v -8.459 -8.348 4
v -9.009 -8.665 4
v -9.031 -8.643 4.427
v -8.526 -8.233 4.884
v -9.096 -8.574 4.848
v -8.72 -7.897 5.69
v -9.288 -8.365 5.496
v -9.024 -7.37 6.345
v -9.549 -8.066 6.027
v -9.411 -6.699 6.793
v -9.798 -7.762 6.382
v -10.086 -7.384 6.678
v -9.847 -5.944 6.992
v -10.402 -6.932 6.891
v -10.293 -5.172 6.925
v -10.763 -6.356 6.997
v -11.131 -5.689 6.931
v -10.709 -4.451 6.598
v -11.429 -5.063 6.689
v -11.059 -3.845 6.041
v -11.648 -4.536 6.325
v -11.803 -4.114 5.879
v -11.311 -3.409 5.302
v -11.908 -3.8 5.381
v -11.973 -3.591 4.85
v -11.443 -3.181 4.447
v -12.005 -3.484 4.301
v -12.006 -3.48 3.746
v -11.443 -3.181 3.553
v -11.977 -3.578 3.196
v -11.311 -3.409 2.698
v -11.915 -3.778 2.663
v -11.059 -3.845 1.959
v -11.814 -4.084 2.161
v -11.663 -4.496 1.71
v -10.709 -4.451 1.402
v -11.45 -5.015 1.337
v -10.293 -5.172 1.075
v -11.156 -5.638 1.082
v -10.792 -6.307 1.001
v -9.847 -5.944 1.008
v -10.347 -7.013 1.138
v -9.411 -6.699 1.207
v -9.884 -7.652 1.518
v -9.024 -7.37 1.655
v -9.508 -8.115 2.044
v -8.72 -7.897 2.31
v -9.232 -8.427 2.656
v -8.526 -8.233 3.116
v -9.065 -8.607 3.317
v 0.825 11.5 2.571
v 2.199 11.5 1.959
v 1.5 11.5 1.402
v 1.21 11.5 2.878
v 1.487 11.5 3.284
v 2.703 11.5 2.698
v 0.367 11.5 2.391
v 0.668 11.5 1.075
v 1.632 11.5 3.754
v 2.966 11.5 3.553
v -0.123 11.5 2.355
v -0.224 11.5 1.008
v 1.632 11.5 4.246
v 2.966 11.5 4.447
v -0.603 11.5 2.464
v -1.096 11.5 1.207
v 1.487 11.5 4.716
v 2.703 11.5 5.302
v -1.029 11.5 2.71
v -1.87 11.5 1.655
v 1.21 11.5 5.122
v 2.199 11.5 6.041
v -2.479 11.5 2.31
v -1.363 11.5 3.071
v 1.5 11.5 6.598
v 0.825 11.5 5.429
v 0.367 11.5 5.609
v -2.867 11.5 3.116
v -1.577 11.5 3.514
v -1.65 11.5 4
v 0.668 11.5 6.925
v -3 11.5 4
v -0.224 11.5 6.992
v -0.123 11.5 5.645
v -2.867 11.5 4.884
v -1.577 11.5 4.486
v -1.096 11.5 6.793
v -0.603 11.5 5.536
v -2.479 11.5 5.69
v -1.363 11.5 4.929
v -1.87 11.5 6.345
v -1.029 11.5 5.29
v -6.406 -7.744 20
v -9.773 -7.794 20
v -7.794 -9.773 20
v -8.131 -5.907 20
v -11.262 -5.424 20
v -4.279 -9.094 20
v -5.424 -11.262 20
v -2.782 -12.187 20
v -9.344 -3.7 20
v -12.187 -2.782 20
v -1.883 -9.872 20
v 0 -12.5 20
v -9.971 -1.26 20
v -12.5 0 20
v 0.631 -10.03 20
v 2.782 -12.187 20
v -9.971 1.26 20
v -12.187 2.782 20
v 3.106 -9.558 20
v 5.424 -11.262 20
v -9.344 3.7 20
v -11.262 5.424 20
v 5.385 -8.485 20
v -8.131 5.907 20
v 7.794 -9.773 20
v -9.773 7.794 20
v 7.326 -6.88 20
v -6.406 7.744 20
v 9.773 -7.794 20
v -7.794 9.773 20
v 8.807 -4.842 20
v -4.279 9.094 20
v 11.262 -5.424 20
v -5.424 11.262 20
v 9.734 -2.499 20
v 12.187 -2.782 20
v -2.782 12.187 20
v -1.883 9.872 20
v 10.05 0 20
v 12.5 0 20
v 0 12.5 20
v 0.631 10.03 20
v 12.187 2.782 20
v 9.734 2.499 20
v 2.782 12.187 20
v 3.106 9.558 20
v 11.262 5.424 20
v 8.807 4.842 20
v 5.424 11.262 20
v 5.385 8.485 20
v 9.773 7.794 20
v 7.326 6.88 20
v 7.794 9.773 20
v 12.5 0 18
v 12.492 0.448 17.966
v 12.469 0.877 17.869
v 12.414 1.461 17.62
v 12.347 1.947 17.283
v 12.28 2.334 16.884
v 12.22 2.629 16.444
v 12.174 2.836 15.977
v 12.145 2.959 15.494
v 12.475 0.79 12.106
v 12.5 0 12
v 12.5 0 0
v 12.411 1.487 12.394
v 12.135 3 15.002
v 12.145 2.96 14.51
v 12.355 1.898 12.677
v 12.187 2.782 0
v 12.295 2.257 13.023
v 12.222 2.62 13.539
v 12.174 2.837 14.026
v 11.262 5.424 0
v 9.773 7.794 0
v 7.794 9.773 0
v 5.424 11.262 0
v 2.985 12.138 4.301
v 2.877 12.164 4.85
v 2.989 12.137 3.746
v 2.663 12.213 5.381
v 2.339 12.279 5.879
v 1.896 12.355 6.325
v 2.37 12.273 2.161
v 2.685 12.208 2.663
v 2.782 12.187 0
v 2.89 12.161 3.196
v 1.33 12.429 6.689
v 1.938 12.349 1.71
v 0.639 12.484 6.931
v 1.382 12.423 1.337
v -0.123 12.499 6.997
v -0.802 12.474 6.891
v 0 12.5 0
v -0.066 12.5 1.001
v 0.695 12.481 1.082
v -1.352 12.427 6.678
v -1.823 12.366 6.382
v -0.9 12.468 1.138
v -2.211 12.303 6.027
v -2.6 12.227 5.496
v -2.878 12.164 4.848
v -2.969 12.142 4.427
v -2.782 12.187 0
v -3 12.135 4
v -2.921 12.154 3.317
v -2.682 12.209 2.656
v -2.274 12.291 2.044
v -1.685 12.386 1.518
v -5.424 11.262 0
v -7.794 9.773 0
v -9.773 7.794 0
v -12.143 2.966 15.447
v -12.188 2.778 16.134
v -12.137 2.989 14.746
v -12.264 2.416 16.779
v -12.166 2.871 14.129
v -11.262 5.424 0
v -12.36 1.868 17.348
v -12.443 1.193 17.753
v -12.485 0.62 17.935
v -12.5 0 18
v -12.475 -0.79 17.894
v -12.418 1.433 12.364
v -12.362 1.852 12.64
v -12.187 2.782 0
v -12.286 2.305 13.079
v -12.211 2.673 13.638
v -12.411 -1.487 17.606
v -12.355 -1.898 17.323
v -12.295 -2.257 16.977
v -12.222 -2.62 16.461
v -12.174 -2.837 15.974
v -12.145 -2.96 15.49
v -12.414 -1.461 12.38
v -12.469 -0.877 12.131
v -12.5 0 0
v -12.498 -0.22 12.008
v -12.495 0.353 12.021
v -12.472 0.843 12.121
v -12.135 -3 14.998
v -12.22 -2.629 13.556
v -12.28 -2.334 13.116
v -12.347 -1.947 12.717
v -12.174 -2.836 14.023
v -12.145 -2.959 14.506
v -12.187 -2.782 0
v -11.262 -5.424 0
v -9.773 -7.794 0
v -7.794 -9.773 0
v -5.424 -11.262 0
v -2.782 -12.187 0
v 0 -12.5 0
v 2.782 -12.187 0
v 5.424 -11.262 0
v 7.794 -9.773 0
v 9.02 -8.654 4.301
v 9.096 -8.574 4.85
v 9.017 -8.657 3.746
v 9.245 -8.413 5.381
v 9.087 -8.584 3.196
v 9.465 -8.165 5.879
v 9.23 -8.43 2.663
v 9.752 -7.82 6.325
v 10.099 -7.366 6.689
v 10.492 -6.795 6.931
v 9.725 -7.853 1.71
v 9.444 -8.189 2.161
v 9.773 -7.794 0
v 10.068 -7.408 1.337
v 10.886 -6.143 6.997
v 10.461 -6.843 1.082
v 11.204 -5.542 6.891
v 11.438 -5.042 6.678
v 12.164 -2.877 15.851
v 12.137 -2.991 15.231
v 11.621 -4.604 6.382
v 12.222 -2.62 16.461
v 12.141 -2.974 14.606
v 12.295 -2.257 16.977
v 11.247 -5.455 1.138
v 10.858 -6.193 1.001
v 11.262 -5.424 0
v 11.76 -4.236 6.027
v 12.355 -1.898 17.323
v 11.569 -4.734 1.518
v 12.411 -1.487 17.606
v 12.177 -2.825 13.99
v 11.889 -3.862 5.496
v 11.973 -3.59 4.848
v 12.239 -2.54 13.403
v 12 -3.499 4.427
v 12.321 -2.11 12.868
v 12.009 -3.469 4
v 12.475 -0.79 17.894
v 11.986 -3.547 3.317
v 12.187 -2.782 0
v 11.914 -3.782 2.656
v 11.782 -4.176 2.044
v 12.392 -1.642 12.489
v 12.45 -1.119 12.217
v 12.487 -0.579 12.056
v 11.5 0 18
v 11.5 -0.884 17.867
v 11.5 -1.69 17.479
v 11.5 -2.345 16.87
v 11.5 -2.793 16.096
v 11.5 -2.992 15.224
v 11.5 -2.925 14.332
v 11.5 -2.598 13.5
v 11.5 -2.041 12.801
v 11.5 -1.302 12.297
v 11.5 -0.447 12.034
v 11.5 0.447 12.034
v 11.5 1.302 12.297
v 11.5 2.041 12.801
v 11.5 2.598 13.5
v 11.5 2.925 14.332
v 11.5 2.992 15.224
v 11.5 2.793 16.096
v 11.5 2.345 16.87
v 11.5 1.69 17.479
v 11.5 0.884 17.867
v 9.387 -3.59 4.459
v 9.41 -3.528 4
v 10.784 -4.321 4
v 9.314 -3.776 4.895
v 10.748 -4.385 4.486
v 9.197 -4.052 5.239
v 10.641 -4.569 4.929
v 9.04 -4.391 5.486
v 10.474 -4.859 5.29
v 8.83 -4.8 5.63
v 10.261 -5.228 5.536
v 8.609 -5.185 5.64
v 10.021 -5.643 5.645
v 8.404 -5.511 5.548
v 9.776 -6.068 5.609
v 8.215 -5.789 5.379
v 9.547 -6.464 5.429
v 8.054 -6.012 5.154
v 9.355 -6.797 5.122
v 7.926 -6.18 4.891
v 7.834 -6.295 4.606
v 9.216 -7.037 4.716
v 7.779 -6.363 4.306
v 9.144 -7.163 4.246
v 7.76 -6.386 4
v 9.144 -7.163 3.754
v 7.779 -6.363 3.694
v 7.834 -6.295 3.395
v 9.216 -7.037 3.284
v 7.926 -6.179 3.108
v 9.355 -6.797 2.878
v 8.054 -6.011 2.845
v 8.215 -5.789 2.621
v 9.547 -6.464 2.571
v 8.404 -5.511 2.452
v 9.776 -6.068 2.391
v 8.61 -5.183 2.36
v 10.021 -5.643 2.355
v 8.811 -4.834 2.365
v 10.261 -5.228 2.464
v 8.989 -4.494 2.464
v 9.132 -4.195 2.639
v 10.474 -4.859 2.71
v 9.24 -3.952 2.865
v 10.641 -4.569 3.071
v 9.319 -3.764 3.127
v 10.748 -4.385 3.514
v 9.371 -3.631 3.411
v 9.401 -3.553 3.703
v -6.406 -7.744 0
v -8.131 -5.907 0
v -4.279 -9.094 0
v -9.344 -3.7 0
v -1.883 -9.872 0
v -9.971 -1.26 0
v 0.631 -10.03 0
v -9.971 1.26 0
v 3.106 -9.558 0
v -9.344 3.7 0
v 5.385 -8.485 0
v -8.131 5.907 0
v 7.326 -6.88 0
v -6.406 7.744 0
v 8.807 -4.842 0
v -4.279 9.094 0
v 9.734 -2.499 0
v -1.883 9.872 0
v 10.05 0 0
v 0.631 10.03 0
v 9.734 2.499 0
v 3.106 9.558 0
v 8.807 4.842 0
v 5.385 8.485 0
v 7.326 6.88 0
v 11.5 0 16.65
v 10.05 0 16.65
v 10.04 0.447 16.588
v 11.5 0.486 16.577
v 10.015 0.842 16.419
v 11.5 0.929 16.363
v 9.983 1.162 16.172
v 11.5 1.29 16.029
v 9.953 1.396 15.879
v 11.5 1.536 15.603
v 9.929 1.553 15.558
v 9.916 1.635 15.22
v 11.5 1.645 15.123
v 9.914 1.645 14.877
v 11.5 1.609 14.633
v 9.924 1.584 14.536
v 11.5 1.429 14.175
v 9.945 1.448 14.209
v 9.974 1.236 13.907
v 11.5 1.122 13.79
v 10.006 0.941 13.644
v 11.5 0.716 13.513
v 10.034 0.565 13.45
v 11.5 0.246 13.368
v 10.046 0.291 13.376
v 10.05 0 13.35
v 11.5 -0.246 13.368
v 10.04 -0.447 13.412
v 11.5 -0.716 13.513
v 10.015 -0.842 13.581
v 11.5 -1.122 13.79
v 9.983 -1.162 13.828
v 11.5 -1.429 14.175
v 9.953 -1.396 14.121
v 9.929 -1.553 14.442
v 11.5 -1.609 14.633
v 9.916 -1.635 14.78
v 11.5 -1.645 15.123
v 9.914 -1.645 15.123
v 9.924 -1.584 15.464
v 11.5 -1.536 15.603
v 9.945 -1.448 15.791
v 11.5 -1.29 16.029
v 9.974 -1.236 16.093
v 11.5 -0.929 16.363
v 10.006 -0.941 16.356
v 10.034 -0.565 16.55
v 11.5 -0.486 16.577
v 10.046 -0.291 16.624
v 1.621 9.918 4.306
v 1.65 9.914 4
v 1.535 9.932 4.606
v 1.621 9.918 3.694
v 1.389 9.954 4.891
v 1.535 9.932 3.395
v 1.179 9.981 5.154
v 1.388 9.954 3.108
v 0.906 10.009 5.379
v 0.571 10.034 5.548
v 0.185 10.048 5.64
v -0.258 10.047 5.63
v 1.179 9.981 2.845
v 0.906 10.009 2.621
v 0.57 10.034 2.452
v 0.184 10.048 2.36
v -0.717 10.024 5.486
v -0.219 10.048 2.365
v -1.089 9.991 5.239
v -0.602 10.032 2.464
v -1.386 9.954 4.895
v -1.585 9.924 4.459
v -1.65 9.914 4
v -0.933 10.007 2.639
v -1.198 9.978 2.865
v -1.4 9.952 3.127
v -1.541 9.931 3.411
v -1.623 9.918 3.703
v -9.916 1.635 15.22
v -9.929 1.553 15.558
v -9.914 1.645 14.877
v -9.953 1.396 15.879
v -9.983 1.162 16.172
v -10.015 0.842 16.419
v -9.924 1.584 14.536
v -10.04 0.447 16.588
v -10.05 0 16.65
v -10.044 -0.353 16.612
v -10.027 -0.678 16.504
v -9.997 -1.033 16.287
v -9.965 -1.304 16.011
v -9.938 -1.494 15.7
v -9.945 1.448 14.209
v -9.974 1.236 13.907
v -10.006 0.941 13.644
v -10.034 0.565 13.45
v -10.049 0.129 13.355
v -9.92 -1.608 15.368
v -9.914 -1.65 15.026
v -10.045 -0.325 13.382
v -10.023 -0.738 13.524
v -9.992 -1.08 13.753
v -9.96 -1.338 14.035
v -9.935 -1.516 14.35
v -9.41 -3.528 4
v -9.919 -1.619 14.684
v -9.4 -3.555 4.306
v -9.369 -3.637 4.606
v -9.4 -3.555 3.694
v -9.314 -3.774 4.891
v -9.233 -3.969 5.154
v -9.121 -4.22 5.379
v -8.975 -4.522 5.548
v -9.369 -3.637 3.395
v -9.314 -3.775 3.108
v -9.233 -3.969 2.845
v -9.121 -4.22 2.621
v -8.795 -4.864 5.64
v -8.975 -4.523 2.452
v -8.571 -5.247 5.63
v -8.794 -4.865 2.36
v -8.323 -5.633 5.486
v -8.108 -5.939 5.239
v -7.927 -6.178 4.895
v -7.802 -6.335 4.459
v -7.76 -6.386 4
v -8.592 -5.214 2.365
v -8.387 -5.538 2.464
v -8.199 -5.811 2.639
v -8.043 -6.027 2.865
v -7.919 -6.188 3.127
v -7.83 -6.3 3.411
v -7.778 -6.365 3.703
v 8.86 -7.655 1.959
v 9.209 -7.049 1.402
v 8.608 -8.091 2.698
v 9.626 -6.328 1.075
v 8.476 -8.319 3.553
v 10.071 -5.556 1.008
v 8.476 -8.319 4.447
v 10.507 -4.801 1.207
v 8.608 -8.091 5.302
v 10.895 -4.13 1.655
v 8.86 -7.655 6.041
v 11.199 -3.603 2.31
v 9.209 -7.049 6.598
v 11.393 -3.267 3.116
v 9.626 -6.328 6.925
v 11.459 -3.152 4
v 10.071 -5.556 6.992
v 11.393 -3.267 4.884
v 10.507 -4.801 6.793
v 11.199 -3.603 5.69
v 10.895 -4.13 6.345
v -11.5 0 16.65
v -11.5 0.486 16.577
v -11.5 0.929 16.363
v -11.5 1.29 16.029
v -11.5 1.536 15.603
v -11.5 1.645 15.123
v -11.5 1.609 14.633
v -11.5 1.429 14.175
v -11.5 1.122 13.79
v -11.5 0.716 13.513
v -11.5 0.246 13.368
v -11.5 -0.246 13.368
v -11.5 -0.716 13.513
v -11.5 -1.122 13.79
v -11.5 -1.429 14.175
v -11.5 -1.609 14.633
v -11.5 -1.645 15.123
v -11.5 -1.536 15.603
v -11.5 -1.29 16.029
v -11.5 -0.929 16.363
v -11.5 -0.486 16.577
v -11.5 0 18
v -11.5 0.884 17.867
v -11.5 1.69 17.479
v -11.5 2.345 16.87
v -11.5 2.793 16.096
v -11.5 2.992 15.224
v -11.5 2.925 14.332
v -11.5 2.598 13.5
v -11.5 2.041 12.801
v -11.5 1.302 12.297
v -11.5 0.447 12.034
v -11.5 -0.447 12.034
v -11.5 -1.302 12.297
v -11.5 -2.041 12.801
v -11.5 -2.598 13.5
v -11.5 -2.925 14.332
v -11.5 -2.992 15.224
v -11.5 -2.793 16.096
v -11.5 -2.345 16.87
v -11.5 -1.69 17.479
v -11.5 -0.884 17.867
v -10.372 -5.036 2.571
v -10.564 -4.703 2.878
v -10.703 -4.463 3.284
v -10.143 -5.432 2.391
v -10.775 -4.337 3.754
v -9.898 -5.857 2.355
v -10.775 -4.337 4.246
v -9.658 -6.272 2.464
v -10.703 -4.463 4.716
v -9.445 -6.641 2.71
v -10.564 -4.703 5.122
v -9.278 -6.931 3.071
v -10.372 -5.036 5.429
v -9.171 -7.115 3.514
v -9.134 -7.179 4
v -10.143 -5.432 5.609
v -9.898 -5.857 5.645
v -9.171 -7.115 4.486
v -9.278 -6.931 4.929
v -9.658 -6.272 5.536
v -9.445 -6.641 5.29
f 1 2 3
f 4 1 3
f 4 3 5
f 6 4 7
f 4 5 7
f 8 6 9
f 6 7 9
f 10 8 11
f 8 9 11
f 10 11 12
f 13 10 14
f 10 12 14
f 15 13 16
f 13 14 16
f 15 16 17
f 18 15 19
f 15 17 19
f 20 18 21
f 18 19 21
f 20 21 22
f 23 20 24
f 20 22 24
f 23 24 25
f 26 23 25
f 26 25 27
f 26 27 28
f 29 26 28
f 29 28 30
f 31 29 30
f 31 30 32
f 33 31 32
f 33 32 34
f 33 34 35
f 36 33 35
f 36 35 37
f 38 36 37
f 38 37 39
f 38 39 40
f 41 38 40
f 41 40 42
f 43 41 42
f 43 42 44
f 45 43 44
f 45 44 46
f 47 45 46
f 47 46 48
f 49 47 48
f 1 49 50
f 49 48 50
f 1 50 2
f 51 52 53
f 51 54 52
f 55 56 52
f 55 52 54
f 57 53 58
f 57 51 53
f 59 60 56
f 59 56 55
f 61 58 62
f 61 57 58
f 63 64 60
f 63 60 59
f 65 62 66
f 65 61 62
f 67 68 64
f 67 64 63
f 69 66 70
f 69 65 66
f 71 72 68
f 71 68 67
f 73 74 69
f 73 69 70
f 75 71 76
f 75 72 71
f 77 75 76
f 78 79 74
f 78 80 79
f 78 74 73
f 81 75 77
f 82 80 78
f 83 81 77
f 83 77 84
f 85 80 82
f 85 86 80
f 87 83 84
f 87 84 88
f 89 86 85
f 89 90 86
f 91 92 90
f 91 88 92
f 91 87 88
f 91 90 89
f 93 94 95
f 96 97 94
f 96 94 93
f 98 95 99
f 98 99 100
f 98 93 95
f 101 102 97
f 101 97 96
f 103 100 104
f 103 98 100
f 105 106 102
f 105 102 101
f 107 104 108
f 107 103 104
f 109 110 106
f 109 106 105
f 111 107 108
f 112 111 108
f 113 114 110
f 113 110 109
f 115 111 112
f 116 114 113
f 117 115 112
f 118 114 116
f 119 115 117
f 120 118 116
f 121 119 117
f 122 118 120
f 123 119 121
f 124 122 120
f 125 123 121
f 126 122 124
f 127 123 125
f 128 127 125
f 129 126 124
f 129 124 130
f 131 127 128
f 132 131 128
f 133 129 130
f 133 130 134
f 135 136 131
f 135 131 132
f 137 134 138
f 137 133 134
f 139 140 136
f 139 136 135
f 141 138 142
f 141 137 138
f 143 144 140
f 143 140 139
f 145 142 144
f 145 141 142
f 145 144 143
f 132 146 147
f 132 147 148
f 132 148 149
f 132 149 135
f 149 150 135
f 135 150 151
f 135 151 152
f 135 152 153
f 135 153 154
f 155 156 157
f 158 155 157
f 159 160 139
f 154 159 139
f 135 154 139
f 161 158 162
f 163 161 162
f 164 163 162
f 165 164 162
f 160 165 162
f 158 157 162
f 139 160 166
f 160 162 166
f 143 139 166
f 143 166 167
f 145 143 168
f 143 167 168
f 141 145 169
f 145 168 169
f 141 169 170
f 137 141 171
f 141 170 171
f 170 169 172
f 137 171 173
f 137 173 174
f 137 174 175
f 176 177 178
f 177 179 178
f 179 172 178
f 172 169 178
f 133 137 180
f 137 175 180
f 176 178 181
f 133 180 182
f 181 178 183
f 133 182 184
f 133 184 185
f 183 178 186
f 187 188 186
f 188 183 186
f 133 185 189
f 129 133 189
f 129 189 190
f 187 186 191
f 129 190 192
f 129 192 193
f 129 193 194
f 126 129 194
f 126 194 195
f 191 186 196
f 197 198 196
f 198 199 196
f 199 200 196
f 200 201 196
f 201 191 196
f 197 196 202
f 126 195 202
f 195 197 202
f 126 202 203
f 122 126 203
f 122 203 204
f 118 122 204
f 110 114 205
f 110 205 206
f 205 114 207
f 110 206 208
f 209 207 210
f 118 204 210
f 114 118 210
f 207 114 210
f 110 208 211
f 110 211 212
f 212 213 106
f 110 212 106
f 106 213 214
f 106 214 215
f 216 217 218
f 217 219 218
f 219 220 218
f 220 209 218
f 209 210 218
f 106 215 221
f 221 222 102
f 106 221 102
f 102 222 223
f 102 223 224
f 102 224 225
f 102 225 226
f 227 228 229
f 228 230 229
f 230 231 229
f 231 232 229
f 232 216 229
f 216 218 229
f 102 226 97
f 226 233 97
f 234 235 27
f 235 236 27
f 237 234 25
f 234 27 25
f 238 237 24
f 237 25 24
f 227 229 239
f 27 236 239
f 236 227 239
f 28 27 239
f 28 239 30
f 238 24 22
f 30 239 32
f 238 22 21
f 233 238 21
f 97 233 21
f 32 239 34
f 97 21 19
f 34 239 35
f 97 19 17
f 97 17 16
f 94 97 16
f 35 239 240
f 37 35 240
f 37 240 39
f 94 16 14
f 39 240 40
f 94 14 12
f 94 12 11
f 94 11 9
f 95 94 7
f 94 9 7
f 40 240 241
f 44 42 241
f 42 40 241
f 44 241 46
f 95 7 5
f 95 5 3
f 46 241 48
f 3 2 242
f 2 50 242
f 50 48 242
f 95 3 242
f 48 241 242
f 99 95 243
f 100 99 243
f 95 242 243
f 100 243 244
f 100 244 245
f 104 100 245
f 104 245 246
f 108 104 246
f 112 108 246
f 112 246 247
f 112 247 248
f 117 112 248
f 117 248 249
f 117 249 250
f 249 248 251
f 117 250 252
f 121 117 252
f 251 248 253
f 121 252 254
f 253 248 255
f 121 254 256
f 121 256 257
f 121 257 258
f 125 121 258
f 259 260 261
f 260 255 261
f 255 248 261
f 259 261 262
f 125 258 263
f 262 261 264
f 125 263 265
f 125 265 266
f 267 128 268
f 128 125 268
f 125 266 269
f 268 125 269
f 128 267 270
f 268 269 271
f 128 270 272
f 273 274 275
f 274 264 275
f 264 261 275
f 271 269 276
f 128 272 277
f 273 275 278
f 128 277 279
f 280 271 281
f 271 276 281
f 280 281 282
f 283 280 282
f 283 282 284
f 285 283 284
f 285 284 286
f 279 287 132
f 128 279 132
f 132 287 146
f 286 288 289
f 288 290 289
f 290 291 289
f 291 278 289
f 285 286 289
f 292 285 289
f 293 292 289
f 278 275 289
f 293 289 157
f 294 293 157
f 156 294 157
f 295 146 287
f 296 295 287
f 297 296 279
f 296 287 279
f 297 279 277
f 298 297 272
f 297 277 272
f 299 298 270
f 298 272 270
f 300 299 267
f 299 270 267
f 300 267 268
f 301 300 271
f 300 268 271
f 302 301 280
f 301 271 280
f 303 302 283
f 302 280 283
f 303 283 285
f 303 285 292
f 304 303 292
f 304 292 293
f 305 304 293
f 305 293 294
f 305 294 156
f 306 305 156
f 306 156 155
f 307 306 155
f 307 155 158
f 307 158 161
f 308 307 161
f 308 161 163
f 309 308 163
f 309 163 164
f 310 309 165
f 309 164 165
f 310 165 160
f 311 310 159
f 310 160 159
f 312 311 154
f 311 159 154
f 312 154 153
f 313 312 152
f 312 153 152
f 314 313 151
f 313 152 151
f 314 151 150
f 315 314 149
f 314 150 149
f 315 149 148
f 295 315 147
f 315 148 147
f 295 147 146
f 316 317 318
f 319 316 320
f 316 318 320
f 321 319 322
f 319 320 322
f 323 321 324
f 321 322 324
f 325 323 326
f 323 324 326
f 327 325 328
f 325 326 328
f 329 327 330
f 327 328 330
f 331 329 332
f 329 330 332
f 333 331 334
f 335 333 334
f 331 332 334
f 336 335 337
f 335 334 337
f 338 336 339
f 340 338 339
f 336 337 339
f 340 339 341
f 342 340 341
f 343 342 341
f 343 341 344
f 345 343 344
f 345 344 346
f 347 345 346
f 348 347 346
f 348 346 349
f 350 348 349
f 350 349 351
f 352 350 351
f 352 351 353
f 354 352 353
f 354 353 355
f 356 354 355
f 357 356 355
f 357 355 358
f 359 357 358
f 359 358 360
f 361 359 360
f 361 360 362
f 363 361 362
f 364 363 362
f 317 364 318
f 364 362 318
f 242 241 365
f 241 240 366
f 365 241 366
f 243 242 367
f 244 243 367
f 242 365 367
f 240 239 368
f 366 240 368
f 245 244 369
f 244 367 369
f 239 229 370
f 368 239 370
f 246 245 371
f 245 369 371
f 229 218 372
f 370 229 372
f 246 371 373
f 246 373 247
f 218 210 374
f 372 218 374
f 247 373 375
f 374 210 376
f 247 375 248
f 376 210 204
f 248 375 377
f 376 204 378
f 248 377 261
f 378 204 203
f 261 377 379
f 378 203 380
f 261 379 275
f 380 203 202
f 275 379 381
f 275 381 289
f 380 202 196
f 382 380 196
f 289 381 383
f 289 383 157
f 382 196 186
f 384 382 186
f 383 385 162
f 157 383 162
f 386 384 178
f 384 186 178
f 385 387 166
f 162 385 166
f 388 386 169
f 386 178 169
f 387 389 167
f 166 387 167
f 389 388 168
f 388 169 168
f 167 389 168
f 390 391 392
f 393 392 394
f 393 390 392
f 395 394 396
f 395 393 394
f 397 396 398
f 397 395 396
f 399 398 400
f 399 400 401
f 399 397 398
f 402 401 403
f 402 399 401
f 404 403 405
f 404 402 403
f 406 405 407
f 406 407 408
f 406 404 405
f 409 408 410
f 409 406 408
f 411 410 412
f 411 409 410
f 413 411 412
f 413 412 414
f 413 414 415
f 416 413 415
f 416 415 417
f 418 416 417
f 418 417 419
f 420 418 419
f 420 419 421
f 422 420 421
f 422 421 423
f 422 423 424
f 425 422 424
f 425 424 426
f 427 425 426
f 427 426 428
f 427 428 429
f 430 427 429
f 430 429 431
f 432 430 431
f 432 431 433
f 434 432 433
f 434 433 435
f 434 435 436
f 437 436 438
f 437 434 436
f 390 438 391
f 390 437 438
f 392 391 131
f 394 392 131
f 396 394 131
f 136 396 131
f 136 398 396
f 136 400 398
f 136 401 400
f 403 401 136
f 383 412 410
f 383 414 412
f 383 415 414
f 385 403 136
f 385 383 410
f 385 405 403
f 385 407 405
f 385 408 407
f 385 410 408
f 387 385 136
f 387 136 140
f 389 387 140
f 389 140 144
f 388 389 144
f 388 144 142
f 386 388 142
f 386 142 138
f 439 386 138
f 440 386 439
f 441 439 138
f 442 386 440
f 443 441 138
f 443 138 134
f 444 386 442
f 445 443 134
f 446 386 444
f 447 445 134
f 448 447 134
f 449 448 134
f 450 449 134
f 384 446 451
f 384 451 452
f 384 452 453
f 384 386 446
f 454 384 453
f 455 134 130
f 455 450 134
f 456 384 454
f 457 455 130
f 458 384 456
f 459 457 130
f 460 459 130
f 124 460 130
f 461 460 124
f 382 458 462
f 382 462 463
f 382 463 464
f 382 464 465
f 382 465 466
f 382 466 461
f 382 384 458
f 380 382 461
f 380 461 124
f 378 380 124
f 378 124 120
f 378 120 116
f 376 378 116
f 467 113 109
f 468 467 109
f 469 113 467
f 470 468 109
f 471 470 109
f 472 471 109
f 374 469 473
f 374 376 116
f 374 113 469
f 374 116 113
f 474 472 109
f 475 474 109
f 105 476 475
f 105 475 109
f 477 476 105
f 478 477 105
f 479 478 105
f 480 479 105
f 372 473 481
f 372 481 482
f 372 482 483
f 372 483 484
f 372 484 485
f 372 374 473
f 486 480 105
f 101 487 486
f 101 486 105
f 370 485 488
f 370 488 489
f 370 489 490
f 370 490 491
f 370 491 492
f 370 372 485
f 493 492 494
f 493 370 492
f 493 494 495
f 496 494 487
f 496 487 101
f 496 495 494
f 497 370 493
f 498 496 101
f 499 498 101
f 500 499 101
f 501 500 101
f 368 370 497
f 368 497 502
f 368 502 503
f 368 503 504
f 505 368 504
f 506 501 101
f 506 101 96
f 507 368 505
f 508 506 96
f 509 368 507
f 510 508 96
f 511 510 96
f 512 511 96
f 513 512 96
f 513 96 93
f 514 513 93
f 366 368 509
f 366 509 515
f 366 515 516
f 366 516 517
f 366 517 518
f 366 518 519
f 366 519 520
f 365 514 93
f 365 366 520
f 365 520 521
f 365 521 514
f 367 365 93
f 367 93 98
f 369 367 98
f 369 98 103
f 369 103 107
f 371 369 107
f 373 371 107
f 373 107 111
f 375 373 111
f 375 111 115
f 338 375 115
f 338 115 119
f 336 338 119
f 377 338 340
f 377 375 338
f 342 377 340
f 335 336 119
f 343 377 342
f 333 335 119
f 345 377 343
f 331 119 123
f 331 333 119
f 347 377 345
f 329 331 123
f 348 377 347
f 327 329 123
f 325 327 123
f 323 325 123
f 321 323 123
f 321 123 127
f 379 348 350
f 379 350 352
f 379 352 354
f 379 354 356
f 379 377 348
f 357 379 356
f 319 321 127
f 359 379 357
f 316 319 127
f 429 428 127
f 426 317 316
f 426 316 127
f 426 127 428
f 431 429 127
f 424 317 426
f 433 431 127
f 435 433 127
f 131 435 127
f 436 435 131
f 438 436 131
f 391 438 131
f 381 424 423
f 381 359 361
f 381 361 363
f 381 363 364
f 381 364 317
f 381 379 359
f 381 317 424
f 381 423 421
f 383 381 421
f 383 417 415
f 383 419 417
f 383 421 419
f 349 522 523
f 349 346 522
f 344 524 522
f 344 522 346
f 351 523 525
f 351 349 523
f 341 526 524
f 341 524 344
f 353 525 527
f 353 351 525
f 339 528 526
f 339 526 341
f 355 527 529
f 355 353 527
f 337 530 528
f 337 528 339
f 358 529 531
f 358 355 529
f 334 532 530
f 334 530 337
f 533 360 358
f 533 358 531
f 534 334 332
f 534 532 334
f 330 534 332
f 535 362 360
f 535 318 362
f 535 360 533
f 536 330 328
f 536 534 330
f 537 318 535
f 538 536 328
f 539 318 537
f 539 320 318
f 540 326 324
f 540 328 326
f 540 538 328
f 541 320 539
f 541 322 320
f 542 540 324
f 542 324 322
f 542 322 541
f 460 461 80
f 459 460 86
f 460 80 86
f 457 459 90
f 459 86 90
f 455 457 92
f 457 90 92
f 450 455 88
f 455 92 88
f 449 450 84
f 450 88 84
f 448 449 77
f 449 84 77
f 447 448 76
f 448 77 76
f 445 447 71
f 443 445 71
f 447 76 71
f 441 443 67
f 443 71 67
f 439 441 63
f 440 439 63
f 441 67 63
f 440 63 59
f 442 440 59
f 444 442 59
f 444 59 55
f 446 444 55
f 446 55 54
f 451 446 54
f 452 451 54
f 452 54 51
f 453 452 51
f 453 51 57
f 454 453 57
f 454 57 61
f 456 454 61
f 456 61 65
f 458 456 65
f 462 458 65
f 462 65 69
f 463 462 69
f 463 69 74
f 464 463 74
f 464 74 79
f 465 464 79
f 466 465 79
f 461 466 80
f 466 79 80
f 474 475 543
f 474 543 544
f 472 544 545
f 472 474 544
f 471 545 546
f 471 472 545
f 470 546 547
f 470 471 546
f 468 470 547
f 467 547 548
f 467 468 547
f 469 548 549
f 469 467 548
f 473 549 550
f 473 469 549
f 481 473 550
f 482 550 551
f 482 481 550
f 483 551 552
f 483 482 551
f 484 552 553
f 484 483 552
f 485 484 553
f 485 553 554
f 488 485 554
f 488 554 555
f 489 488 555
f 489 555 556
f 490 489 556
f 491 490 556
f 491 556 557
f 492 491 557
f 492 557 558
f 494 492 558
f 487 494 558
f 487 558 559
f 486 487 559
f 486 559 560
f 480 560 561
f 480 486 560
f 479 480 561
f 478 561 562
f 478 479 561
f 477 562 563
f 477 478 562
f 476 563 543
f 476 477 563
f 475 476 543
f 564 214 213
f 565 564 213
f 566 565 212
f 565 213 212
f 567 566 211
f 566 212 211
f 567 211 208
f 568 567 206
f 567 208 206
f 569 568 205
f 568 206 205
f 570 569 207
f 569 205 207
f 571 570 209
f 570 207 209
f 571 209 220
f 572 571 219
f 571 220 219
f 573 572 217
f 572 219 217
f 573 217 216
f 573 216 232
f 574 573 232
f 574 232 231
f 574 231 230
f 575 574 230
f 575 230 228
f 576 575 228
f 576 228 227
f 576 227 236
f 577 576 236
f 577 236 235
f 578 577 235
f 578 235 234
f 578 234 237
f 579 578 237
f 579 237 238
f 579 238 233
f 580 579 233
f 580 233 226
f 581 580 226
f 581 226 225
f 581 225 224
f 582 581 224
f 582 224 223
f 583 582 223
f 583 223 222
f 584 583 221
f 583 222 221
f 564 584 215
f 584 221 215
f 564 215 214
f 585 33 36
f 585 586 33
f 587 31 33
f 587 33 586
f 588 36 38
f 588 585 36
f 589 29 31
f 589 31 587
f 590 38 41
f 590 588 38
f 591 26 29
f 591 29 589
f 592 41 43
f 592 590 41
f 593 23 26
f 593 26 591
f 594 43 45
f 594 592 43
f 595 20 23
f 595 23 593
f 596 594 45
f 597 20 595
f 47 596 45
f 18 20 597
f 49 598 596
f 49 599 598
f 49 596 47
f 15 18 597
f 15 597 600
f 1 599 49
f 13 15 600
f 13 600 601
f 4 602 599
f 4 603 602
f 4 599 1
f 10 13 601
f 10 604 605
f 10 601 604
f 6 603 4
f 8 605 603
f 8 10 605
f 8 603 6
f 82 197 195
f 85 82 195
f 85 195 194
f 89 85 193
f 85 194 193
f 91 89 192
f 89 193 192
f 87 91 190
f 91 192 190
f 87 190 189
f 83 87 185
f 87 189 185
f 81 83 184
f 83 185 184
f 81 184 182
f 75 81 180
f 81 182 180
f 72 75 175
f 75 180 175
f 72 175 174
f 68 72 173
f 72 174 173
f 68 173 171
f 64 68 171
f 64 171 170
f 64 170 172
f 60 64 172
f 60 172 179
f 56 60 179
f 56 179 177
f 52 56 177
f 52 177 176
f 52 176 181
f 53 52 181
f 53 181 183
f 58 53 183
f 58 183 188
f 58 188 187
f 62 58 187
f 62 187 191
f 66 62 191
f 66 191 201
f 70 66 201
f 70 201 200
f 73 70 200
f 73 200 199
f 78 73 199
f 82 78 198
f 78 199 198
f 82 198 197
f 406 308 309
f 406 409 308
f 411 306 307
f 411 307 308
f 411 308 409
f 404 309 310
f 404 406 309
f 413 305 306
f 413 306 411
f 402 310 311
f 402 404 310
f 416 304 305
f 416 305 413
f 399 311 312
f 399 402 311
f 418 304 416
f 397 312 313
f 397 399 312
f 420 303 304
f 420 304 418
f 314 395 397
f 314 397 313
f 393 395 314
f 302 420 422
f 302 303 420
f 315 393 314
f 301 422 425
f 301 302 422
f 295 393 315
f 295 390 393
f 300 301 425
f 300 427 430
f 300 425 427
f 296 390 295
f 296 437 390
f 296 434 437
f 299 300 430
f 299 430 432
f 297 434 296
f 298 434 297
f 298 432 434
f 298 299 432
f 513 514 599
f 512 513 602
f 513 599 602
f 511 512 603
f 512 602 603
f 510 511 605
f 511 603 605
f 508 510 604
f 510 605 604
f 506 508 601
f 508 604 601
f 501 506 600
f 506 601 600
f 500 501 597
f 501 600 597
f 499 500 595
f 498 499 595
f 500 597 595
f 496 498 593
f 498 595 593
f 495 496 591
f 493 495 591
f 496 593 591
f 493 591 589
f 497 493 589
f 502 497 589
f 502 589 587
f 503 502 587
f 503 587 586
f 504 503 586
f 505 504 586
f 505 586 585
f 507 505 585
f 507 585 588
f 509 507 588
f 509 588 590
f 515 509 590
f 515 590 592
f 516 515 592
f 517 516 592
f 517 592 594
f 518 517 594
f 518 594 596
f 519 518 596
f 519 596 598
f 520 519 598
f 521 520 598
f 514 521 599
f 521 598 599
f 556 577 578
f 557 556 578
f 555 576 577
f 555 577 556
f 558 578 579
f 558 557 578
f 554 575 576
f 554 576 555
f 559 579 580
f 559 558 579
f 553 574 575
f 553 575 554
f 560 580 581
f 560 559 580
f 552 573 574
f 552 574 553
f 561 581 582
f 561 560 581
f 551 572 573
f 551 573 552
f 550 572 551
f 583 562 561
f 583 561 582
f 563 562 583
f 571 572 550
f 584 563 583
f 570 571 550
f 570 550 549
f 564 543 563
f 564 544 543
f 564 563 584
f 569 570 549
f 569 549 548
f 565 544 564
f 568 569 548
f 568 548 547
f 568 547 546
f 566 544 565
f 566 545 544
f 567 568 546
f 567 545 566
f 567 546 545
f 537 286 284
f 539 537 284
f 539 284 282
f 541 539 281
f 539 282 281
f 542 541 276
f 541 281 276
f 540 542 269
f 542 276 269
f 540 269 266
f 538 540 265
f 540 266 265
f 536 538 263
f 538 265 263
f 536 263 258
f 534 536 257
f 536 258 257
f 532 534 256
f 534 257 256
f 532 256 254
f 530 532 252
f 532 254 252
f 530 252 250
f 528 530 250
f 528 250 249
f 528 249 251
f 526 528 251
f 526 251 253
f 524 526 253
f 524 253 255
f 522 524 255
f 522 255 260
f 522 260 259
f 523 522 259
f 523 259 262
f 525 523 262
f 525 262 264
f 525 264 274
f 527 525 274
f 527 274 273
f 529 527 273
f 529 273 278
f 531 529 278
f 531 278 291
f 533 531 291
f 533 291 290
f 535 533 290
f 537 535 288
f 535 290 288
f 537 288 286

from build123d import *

# Parameters (mm, degrees)
SKETCH1_R               = 12.5
SKETCH1_R_2             = 10.05
BOSS_EXTRUDE1_DEPTH     = 20
SKETCH3_R               = 1.65
CUT_EXTRUDE1_DEPTH      = 4
CIRPATTERN1_COUNT       = 3
SKETCH5_R               = 3
CUT_EXTRUDE3_DEPTH      = 1
CIRPATTERN2_COUNT       = 3
CUT_EXTRUDE5_DEPTH      = 35.369317885
CUT_EXTRUDE5_DEPTH_BACK = 35.369317885
SKETCH7_R               = 1.65
SKETCH8_R               = 3
CUT_EXTRUDE6_DEPTH      = 1
CIRPATTERN6_COUNT       = 2


with BuildPart() as part:
    # Sketch1 → Boss-Extrude1 (new body)
    with BuildSketch(Plane.XY):
        Circle(SKETCH1_R)
        Circle(SKETCH1_R_2, mode=Mode.SUBTRACT)
    extrude(amount=BOSS_EXTRUDE1_DEPTH)

    # Sketch3 → Cut-Extrude1 (cut)
    with BuildSketch(Plane(origin=(-10.825317547, -6.25, 0), x_dir=(0, 0, 1), z_dir=(-0.8660254037844362, -0.5000000000000046, 0))):
        with Locations(Location((4, 0, 0), (0, 0, 270))):
            Circle(SKETCH3_R)
    cut_extrude1 = extrude(amount=-CUT_EXTRUDE1_DEPTH, mode=Mode.SUBTRACT)

    # CirPattern1: Cut-Extrude1 ×3 about axis
    cirpattern1_axis = Axis((0, 0, 0), (0, 0, 1))
    for i in range(1, CIRPATTERN1_COUNT):
        add(cut_extrude1.rotate(cirpattern1_axis, i * 360 / CIRPATTERN1_COUNT), mode=Mode.SUBTRACT)

    # Sketch5 → Cut-Extrude3 (cut)
    with BuildSketch(Plane(origin=(-10.825317547, -6.25, 0), x_dir=(0, 0, 1), z_dir=(-0.8660254037844362, -0.5000000000000046, 0))):
        with Locations(Location((4, 0, 0), (0, 0, 270))):
            Circle(SKETCH5_R)
    cut_extrude3 = extrude(amount=-CUT_EXTRUDE3_DEPTH, mode=Mode.SUBTRACT)

    # CirPattern2: Cut-Extrude3 ×3 about axis
    cirpattern2_axis = Axis((0, 0, 0), (0, 0, 1))
    for i in range(1, CIRPATTERN2_COUNT):
        add(cut_extrude3.rotate(cirpattern2_axis, i * 360 / CIRPATTERN2_COUNT), mode=Mode.SUBTRACT)

    # Sketch7 → Cut-Extrude5 (cut, two sides: drawn at the far end of the back side and taken through both)
    with BuildSketch(Plane.ZY.offset(12.5).offset(-CUT_EXTRUDE5_DEPTH_BACK)):
        with Locations((15, 0)):
            Circle(SKETCH7_R)
    extrude(amount=CUT_EXTRUDE5_DEPTH + CUT_EXTRUDE5_DEPTH_BACK, mode=Mode.SUBTRACT)

    # Sketch8 → Cut-Extrude6 (cut)
    with BuildSketch(Plane.ZY.offset(12.5)):
        with Locations((15, 0)):
            Circle(SKETCH8_R)
    cut_extrude6 = extrude(amount=-CUT_EXTRUDE6_DEPTH, mode=Mode.SUBTRACT)

    # CirPattern6: Cut-Extrude6 ×2 about axis
    cirpattern6_axis = Axis((0, 0, 20), (0, 0, -1))
    for i in range(1, CIRPATTERN6_COUNT):
        add(cut_extrude6.rotate(cirpattern6_axis, i * 360 / CIRPATTERN6_COUNT), mode=Mode.SUBTRACT)


solid = part.part
